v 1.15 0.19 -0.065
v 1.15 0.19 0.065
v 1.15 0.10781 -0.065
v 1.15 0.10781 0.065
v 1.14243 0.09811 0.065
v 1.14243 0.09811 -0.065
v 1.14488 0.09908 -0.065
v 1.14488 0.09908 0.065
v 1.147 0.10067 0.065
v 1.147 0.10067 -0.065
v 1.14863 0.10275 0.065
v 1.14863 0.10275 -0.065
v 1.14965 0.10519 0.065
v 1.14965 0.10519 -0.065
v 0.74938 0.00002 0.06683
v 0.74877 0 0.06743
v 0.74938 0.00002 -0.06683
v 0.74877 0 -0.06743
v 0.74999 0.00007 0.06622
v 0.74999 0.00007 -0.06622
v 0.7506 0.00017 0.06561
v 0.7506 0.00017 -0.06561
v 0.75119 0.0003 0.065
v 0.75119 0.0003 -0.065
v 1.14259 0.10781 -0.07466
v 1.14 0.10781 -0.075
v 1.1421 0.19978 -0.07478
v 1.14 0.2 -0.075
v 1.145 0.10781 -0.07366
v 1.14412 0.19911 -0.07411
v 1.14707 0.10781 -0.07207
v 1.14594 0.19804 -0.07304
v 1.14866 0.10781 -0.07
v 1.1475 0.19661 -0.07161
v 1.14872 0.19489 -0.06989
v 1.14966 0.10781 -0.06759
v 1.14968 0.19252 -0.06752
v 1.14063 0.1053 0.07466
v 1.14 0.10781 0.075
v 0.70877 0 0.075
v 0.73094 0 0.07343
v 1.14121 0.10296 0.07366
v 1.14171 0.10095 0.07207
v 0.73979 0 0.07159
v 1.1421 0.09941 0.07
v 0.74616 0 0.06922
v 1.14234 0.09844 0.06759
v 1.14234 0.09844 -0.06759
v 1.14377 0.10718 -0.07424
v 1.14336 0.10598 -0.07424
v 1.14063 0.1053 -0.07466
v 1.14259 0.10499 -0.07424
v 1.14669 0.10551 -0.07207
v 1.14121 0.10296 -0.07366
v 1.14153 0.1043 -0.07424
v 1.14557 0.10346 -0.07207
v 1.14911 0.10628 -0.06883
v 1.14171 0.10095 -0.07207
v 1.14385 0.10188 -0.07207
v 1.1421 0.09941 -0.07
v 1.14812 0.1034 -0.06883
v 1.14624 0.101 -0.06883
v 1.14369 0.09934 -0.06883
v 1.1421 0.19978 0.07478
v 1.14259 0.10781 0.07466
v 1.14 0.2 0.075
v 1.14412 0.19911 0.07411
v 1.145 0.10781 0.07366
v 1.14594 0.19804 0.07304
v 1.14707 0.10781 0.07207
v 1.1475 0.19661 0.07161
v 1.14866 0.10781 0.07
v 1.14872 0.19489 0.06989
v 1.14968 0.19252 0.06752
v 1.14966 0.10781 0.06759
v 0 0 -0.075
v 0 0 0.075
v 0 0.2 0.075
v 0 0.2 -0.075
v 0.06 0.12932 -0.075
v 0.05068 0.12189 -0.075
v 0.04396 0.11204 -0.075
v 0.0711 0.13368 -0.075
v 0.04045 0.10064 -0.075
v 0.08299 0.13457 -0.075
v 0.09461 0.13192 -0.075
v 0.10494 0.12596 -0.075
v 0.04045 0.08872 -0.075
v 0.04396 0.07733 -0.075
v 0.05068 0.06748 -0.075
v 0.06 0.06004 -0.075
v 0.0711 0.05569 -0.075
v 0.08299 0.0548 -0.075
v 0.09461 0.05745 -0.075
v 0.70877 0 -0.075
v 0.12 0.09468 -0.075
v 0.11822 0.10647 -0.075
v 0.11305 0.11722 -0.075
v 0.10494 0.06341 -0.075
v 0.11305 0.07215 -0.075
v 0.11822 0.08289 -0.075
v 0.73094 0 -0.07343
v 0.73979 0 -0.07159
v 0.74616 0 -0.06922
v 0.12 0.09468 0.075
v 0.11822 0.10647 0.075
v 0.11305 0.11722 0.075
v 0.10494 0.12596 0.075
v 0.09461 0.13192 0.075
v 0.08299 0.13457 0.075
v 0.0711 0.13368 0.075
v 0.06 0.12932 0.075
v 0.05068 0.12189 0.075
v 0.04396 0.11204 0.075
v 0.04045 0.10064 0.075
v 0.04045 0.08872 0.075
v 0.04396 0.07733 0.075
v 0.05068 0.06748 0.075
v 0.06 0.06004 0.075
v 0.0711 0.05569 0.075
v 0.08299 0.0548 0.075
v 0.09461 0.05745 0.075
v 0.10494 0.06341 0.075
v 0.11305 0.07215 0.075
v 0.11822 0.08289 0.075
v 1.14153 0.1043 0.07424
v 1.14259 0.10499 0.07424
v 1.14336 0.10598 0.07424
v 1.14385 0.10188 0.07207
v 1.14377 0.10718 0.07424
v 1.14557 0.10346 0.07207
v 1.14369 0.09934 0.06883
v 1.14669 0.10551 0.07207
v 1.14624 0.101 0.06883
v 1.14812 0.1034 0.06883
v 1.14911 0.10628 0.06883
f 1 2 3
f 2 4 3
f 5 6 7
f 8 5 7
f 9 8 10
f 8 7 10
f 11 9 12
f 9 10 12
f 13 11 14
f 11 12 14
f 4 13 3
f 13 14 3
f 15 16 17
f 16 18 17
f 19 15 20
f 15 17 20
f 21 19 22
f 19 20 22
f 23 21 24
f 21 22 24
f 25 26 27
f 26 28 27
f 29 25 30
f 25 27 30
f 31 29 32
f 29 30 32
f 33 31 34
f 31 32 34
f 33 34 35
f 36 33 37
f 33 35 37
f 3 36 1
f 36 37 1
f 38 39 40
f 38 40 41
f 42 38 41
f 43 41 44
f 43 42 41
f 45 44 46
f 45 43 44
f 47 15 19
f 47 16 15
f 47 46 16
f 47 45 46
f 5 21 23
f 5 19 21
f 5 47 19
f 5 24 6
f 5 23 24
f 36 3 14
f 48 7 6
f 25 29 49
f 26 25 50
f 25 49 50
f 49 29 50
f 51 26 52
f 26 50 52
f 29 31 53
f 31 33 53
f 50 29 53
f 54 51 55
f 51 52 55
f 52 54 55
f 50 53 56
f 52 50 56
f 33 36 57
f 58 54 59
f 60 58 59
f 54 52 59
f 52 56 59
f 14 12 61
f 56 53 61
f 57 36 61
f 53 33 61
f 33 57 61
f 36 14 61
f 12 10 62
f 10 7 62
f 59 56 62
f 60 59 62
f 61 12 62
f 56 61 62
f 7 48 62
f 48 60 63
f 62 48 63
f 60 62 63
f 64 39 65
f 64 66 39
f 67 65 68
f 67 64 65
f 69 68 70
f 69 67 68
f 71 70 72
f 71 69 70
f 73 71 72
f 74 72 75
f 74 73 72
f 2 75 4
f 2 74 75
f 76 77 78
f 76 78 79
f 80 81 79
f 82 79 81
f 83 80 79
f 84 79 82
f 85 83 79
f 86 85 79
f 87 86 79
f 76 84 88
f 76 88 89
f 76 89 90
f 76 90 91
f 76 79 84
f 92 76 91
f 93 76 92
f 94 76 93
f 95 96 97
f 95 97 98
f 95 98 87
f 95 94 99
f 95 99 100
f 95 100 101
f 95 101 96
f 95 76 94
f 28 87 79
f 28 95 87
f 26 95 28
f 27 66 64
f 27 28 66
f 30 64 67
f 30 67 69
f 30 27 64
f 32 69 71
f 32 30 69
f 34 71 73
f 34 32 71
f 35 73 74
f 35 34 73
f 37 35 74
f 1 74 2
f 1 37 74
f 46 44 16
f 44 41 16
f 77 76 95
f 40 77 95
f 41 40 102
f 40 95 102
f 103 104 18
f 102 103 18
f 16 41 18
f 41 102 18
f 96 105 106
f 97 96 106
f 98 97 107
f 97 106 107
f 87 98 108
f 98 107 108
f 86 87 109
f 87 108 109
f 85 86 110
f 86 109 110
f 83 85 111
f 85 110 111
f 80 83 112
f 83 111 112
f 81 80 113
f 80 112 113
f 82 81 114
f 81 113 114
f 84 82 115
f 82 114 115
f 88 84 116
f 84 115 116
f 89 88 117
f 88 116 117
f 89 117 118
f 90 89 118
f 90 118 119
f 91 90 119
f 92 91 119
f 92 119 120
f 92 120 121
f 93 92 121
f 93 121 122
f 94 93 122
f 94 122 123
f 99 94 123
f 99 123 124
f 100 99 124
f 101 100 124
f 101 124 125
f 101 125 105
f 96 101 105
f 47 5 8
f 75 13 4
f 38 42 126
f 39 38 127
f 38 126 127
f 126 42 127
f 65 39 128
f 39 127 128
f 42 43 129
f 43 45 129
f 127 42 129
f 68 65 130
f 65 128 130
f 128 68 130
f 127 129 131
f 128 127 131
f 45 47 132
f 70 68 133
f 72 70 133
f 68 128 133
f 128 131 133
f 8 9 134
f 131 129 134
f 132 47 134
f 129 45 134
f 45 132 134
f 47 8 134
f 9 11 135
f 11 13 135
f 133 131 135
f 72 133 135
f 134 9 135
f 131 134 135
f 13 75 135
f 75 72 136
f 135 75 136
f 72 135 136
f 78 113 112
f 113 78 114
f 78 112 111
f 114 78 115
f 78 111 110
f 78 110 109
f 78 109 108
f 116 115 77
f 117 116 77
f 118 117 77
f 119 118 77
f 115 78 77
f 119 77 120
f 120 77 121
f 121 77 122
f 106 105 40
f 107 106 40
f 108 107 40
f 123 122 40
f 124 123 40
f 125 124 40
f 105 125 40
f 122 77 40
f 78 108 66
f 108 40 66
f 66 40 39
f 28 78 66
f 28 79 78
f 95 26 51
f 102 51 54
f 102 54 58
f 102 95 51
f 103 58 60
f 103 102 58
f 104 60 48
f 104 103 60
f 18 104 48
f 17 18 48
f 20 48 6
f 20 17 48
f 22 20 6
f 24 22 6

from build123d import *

# Parameters (mm, degrees)
CROQUIS1_W              = 1.15
CROQUIS1_H              = 0.15
SALIENTE_EXTRUIR2_DEPTH = 0.2
CORTAR_EXTRUIR1_DEPTH   = 2.17686023
REDONDEO1_R             = 0.01
CROQUIS3_R              = 0.04
CORTAR_EXTRUIR2_DEPTH   = 2.17686023


with BuildPart() as part:
    # Croquis1 → Saliente-Extruir2 (new body)
    with BuildSketch(Plane(origin=(0, 0, 0), x_dir=(1, 0, 0), z_dir=(0, 1, 0))):
        with Locations((0.575, 0)):
            Rectangle(CROQUIS1_W, CROQUIS1_H)
    extrude(amount=SALIENTE_EXTRUIR2_DEPTH)

    # Croquis2 → Cortar-Extruir1 (cut, through all)
    with BuildSketch(Plane.XY.offset(0.075)):
        Polygon((0.75, 0), (1.15, 0.1), (1.15, 0), align=None)
    extrude(amount=-CORTAR_EXTRUIR1_DEPTH, mode=Mode.SUBTRACT)

    # Redondeo1
    redondeo1_edges = [part.edges().sort_by_distance(p)[0] for p in [
        (1.15, 0.2, 0),
        (0.95, 0.05, -0.075),
        (0.75, 0, 0),
        (1.15, 0.1, 0),
        (0.95, 0.05, 0.075),
        (1.15, 0.15, -0.075),
        (1.15, 0.15, 0.075),
    ]]
    fillet(redondeo1_edges, radius=REDONDEO1_R)

    # Croquis3 → Cortar-Extruir2 (cut, through all)
    with BuildSketch(Plane.XY.offset(0.075)):
        with Locations((0.08, 0.094683269)):
            Circle(CROQUIS3_R)
    extrude(amount=-CORTAR_EXTRUIR2_DEPTH, mode=Mode.SUBTRACT)


solid = part.part
